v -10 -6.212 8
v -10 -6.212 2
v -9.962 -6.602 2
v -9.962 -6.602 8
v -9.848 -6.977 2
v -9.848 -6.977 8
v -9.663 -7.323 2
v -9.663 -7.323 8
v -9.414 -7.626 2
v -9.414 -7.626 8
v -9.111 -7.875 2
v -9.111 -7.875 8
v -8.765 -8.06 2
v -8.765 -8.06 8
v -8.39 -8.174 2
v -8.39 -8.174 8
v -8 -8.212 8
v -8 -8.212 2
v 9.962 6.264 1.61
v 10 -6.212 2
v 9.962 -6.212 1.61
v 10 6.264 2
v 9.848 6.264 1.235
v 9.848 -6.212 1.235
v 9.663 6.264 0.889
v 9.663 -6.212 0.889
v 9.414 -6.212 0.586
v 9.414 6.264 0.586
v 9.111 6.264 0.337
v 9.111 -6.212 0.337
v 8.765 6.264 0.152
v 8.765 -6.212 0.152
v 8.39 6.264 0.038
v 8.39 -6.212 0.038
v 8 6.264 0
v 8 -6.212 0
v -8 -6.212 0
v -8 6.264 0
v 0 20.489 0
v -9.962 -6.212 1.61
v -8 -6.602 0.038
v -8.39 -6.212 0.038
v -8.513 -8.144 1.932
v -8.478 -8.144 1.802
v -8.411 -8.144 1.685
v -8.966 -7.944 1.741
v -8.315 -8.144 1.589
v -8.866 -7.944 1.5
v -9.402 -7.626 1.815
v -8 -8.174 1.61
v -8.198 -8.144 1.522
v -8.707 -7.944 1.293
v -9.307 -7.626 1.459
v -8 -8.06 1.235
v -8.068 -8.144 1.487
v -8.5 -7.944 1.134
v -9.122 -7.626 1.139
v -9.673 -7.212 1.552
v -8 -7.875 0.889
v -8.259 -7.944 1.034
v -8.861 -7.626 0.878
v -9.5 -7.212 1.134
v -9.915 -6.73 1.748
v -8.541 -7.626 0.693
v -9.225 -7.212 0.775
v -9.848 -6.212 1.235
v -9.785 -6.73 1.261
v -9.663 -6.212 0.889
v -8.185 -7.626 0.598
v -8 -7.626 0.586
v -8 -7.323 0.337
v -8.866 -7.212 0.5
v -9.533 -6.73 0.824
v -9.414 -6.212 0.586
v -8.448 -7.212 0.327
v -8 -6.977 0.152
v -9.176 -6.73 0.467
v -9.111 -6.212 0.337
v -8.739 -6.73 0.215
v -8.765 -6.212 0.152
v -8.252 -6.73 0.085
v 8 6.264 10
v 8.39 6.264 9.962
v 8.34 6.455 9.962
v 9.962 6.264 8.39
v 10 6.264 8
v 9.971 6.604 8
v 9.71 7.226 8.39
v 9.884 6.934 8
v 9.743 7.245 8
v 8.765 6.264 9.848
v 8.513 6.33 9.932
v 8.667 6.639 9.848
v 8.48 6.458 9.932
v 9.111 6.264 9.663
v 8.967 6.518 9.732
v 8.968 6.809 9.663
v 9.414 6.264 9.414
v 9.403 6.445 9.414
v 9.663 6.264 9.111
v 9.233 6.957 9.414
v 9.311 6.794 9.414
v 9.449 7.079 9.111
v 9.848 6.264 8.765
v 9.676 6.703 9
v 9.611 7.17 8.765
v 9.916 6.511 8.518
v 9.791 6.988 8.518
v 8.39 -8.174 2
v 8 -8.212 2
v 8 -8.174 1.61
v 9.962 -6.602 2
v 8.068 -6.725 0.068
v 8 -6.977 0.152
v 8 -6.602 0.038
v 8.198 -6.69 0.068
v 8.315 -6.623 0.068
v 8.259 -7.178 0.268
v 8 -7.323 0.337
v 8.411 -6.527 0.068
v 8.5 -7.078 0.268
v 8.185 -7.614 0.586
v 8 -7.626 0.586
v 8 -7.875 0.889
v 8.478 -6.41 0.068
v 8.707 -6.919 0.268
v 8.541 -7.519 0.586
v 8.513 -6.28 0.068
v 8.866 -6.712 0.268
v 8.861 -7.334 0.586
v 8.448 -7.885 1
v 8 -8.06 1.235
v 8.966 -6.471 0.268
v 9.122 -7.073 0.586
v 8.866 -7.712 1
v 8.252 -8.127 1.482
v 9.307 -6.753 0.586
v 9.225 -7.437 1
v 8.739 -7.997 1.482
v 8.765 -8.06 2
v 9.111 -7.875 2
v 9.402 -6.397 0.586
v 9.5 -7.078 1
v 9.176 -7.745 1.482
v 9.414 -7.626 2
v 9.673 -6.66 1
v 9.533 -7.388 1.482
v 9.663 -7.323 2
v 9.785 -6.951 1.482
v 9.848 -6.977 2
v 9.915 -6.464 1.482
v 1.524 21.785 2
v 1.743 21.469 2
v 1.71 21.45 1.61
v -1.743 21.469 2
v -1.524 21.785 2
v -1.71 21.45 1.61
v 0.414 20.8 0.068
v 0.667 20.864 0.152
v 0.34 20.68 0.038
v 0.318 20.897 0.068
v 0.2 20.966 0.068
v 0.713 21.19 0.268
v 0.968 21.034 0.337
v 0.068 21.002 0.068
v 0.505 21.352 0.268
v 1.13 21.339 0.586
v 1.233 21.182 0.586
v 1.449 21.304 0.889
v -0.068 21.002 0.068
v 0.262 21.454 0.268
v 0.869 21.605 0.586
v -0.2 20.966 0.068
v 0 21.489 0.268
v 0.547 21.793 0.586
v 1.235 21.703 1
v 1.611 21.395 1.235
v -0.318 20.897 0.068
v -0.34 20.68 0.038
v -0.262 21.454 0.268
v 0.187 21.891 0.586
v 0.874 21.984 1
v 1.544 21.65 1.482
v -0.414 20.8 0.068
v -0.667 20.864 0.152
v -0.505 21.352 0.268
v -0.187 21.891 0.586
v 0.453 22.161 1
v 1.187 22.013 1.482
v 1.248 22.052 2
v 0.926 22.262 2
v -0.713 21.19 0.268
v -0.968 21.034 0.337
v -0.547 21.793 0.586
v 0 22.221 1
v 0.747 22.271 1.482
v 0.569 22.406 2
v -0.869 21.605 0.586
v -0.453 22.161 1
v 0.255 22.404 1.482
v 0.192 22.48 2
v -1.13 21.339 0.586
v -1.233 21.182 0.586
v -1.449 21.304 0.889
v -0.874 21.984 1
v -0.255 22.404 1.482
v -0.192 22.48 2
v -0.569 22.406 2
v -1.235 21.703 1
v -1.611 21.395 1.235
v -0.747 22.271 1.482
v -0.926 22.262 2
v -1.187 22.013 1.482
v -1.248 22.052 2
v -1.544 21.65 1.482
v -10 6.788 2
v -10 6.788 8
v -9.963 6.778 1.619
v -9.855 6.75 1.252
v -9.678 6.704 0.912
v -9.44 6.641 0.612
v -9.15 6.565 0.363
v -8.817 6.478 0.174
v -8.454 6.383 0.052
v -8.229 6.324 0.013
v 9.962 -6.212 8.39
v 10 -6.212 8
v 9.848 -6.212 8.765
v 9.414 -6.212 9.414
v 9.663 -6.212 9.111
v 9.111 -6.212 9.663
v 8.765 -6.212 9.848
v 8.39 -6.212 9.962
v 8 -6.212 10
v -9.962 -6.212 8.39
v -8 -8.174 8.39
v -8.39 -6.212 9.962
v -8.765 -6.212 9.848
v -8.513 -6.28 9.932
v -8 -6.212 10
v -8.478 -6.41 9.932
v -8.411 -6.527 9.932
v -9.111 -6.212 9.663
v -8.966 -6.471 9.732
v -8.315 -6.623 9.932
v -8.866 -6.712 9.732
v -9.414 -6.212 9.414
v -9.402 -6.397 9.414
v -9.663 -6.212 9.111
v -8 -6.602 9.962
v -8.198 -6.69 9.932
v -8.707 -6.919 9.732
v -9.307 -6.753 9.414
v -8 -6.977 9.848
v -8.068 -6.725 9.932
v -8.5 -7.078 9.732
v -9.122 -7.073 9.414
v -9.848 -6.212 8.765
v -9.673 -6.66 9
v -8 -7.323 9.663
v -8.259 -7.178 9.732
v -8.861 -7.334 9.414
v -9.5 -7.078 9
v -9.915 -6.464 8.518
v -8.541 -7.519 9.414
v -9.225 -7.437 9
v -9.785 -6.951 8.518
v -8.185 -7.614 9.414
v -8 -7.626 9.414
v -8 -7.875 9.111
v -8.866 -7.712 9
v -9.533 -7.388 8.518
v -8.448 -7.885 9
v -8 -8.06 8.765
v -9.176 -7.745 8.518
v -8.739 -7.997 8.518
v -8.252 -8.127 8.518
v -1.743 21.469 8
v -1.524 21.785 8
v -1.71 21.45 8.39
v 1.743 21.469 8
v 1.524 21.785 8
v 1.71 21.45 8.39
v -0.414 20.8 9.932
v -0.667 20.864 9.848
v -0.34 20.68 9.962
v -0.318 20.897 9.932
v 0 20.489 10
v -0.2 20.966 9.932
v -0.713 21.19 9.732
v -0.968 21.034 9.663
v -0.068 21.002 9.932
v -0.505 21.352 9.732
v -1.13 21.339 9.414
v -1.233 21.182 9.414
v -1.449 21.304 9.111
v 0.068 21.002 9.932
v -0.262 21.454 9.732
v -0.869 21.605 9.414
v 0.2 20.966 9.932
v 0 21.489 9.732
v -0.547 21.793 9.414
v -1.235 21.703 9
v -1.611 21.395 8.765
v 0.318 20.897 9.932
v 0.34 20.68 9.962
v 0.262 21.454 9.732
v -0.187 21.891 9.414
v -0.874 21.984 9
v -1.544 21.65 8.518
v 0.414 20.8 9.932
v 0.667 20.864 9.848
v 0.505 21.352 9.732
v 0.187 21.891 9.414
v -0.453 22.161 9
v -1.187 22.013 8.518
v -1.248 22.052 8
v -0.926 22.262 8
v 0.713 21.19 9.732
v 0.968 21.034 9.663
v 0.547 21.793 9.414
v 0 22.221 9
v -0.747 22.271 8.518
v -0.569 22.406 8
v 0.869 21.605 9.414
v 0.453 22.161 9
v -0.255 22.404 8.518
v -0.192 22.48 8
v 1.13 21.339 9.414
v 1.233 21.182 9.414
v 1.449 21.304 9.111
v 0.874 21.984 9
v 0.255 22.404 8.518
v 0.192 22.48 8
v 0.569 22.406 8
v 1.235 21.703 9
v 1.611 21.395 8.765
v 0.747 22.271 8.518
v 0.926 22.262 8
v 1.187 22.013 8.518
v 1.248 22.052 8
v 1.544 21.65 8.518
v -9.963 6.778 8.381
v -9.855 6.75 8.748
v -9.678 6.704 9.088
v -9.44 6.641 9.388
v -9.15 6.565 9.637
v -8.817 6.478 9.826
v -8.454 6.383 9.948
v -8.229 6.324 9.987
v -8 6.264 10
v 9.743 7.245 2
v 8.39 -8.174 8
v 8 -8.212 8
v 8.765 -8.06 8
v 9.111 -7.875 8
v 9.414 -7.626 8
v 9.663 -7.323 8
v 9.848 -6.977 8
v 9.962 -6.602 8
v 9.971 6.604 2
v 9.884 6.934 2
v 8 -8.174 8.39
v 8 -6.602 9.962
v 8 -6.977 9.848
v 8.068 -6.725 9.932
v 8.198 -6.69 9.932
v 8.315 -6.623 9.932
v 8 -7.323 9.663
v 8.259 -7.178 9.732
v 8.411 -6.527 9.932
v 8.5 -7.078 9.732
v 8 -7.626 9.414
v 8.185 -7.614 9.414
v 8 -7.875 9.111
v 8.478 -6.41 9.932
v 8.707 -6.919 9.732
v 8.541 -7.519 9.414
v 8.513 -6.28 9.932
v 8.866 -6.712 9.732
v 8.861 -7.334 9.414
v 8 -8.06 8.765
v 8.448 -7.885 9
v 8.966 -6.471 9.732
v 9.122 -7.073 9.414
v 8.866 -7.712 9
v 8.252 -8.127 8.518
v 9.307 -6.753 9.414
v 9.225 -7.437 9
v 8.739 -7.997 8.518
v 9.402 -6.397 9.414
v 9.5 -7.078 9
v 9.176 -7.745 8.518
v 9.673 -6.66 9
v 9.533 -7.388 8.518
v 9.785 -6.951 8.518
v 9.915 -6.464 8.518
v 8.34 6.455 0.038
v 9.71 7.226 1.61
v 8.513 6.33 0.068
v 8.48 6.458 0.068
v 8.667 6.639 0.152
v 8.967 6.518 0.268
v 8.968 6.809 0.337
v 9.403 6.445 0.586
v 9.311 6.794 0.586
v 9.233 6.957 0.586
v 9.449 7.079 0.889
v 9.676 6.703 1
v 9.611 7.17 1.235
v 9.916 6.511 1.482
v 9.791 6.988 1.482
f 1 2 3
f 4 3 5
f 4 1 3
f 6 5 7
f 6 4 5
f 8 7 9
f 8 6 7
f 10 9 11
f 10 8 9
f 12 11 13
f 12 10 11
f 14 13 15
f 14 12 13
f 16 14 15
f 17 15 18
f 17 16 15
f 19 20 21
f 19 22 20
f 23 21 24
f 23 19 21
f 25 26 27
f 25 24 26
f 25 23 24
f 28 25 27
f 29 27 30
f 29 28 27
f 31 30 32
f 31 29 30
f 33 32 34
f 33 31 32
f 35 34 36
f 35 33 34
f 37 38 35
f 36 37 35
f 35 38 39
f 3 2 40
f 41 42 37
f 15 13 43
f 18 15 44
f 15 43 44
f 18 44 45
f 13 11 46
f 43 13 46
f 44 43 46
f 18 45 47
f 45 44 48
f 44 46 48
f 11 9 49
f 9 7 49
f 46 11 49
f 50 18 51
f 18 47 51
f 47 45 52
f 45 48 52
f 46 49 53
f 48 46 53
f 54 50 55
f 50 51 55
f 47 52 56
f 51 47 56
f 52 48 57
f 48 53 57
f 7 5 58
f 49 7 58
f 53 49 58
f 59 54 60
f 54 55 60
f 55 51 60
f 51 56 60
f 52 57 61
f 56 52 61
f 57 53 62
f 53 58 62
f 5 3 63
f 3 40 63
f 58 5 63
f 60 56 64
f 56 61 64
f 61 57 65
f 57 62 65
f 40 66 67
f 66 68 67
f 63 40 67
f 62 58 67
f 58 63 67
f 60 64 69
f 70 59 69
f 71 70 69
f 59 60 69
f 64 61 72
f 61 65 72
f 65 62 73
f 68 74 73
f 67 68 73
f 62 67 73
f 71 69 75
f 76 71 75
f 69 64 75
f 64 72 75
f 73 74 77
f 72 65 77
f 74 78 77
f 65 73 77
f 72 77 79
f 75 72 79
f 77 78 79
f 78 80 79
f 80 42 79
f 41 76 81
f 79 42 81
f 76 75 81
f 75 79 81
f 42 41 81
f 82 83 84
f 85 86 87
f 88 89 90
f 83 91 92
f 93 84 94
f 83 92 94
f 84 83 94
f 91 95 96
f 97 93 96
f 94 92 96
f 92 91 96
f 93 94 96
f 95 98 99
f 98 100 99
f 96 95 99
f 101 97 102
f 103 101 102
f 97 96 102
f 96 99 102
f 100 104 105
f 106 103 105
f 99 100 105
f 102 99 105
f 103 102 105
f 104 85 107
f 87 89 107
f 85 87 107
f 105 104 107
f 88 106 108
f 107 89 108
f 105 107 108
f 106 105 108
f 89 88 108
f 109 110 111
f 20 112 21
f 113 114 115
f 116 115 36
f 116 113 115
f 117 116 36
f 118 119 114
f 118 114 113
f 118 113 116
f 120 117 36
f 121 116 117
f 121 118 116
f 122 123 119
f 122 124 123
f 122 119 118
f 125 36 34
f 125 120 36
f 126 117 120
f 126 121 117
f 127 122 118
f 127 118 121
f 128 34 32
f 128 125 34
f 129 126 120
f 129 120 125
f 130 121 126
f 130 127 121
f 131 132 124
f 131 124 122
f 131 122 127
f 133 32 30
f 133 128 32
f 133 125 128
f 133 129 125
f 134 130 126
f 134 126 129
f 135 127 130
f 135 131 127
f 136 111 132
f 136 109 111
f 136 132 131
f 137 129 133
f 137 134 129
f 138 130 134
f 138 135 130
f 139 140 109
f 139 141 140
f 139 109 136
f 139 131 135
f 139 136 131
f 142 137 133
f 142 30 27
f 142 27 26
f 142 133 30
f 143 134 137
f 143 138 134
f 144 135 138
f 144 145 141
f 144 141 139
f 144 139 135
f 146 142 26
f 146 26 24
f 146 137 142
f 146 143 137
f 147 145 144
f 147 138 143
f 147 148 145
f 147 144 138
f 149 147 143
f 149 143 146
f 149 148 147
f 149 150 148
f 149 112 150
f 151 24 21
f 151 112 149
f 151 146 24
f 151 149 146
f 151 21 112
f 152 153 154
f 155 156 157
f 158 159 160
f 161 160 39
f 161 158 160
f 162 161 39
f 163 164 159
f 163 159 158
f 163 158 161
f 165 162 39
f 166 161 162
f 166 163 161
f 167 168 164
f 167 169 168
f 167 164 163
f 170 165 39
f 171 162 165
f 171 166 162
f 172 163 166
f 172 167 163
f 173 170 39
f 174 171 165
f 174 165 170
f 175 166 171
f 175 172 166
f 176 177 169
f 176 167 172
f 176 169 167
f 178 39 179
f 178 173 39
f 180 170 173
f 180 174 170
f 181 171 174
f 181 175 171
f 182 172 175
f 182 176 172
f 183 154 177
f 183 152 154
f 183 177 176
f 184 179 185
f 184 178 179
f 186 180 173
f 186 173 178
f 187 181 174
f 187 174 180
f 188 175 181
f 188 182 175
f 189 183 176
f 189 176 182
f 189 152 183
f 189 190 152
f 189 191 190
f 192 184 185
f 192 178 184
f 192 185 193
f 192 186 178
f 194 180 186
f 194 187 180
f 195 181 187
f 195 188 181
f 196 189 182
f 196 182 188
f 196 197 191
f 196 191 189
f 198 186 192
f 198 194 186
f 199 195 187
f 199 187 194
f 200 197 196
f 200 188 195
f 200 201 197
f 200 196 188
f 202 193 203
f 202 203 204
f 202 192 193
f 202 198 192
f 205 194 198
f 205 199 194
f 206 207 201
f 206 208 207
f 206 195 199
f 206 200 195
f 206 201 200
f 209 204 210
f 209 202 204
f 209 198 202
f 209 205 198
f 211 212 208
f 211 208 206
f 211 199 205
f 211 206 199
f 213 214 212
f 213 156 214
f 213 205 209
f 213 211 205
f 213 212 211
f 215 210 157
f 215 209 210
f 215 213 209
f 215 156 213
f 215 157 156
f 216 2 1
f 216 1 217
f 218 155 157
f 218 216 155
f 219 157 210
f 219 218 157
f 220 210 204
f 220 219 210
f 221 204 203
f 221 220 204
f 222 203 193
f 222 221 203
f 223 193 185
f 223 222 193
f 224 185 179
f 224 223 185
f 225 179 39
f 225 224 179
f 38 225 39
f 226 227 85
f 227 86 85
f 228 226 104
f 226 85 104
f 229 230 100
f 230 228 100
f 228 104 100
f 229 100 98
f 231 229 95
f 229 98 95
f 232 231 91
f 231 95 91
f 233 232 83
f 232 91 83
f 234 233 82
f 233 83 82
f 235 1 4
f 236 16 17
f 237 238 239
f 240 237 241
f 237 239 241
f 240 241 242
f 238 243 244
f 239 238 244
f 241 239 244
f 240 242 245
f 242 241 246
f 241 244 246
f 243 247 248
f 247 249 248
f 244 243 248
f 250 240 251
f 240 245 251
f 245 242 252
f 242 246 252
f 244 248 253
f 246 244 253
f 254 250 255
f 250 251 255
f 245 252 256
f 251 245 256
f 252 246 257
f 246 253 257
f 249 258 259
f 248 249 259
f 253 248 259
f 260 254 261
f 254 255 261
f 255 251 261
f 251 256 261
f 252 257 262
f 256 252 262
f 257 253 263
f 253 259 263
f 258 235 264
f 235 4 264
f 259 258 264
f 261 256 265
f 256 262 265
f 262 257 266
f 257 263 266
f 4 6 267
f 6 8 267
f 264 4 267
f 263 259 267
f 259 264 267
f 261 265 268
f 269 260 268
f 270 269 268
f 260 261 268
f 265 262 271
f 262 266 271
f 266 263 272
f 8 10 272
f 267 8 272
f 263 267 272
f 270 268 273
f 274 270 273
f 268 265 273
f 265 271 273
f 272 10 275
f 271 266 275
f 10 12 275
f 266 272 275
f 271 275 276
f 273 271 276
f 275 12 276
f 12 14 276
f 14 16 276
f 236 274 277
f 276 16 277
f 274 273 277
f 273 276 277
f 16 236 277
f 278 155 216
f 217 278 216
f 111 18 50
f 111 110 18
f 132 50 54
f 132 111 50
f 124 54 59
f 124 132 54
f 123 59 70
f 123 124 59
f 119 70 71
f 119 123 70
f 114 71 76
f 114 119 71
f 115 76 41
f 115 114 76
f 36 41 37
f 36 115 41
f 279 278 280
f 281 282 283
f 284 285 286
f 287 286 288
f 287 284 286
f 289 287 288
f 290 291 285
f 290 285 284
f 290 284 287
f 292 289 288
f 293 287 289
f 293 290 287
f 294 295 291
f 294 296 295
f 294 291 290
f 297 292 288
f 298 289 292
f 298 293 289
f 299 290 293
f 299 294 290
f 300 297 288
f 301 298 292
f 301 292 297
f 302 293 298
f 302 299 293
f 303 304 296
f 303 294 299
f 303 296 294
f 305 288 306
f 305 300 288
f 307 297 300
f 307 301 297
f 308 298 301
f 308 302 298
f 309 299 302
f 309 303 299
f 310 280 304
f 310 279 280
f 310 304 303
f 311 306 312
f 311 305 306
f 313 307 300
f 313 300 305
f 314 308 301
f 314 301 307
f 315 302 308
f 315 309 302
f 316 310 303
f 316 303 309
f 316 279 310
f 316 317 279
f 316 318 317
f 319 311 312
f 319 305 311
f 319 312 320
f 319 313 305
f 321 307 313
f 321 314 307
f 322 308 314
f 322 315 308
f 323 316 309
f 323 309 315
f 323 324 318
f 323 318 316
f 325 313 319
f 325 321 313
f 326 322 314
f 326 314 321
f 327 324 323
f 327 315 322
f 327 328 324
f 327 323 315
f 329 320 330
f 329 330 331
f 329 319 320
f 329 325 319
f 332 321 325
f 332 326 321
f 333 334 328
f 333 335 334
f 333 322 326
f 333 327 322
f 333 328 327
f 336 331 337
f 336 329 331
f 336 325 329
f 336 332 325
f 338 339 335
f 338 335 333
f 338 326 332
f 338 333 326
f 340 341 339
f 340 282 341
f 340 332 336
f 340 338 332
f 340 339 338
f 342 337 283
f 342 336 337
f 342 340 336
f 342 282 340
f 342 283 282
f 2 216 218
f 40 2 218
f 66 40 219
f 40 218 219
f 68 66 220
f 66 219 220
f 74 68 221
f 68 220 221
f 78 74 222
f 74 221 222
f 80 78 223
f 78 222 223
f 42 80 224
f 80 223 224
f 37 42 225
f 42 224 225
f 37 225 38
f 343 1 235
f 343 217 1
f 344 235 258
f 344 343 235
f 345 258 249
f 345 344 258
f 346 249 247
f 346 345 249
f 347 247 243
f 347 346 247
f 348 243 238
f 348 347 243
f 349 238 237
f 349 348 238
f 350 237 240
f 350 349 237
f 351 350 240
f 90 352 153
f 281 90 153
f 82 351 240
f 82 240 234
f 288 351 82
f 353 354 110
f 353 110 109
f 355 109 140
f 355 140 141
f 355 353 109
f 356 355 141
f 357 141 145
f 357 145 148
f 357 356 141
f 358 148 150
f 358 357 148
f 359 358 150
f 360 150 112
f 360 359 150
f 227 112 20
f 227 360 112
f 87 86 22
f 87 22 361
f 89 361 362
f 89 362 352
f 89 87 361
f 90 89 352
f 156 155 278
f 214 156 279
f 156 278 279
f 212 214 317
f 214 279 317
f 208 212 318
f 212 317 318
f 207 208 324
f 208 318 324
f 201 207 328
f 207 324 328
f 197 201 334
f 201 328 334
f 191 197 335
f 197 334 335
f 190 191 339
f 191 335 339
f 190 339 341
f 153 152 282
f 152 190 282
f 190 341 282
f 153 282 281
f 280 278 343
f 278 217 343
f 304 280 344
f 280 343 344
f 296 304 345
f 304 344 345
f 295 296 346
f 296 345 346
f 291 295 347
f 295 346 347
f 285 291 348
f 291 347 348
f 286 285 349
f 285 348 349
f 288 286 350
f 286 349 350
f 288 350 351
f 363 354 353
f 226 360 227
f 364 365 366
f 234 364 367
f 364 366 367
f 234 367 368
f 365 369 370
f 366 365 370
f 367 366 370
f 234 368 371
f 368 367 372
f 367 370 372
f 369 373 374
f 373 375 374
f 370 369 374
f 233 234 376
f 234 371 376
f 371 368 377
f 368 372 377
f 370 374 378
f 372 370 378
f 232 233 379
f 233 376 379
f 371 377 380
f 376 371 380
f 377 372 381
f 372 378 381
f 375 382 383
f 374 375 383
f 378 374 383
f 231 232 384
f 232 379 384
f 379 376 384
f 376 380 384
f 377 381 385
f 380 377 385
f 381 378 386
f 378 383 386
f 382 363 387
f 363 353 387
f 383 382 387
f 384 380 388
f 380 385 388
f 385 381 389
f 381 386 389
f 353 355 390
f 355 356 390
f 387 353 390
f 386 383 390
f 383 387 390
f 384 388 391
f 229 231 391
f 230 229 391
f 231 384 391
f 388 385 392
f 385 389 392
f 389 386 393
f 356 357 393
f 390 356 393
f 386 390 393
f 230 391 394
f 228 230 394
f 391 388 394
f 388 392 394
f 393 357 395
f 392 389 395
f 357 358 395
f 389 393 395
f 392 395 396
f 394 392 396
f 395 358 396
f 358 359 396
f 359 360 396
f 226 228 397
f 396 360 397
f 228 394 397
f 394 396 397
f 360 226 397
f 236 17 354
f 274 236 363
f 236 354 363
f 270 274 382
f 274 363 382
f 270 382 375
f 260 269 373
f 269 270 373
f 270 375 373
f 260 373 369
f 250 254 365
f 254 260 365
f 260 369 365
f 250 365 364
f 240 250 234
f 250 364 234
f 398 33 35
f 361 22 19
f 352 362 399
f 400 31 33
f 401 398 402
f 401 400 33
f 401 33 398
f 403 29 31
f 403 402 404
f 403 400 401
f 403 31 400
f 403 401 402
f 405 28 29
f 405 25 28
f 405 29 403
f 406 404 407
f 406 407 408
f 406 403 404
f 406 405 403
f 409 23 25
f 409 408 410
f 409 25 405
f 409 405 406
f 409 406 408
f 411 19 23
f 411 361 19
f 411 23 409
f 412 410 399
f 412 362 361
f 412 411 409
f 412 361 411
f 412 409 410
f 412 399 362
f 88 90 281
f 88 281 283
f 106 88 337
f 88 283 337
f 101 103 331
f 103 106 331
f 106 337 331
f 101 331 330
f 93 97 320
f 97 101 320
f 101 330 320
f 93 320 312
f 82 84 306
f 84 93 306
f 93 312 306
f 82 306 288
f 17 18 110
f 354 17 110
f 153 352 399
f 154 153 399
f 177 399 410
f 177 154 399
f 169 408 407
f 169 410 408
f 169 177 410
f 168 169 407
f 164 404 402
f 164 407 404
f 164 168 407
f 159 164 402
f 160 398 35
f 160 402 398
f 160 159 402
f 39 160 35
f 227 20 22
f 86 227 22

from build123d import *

# Parameters (mm, degrees)
F0_W     = 20
F0_H     = 15
F1_DEPTH = 10
F3_R     = 2


# Not quite as in the source:
# - a feature of the source that left no trace in its solid (it failed there, or was rolled back) is left out


with BuildPart() as f1:
    # F0 (on Top) → F1 (new body)
    with BuildSketch(Plane.XY):
        Polygon((0, 24.5688632738), (-10, 6.7879746571), (10, 6.7879746571), align=None)
        with Locations((0, -0.7120253429)):
            Rectangle(F0_W, F0_H)
    extrude(amount=F1_DEPTH)

    # F3
    f3_edges = [f1.edges().sort_by_distance(p)[0] for p in [
        (-10, -0.712025, 0),
        (-5, 15.678419, 0),
        (0, 24.568863, 5),
        (-5, 15.678419, 10),
        (-10, -8.212025, 5),
        (-10, -0.712025, 10),
        (10, -8.212025, 5),
        (0, -8.212025, 0),
        (0, -8.212025, 10),
        (10, 6.787975, 5),
        (10, -0.712025, 0),
        (10, -0.712025, 10),
        (5, 15.678419, 0),
        (5, 15.678419, 10),
    ]]
    fillet(f3_edges, radius=F3_R)


solid = f1.part
